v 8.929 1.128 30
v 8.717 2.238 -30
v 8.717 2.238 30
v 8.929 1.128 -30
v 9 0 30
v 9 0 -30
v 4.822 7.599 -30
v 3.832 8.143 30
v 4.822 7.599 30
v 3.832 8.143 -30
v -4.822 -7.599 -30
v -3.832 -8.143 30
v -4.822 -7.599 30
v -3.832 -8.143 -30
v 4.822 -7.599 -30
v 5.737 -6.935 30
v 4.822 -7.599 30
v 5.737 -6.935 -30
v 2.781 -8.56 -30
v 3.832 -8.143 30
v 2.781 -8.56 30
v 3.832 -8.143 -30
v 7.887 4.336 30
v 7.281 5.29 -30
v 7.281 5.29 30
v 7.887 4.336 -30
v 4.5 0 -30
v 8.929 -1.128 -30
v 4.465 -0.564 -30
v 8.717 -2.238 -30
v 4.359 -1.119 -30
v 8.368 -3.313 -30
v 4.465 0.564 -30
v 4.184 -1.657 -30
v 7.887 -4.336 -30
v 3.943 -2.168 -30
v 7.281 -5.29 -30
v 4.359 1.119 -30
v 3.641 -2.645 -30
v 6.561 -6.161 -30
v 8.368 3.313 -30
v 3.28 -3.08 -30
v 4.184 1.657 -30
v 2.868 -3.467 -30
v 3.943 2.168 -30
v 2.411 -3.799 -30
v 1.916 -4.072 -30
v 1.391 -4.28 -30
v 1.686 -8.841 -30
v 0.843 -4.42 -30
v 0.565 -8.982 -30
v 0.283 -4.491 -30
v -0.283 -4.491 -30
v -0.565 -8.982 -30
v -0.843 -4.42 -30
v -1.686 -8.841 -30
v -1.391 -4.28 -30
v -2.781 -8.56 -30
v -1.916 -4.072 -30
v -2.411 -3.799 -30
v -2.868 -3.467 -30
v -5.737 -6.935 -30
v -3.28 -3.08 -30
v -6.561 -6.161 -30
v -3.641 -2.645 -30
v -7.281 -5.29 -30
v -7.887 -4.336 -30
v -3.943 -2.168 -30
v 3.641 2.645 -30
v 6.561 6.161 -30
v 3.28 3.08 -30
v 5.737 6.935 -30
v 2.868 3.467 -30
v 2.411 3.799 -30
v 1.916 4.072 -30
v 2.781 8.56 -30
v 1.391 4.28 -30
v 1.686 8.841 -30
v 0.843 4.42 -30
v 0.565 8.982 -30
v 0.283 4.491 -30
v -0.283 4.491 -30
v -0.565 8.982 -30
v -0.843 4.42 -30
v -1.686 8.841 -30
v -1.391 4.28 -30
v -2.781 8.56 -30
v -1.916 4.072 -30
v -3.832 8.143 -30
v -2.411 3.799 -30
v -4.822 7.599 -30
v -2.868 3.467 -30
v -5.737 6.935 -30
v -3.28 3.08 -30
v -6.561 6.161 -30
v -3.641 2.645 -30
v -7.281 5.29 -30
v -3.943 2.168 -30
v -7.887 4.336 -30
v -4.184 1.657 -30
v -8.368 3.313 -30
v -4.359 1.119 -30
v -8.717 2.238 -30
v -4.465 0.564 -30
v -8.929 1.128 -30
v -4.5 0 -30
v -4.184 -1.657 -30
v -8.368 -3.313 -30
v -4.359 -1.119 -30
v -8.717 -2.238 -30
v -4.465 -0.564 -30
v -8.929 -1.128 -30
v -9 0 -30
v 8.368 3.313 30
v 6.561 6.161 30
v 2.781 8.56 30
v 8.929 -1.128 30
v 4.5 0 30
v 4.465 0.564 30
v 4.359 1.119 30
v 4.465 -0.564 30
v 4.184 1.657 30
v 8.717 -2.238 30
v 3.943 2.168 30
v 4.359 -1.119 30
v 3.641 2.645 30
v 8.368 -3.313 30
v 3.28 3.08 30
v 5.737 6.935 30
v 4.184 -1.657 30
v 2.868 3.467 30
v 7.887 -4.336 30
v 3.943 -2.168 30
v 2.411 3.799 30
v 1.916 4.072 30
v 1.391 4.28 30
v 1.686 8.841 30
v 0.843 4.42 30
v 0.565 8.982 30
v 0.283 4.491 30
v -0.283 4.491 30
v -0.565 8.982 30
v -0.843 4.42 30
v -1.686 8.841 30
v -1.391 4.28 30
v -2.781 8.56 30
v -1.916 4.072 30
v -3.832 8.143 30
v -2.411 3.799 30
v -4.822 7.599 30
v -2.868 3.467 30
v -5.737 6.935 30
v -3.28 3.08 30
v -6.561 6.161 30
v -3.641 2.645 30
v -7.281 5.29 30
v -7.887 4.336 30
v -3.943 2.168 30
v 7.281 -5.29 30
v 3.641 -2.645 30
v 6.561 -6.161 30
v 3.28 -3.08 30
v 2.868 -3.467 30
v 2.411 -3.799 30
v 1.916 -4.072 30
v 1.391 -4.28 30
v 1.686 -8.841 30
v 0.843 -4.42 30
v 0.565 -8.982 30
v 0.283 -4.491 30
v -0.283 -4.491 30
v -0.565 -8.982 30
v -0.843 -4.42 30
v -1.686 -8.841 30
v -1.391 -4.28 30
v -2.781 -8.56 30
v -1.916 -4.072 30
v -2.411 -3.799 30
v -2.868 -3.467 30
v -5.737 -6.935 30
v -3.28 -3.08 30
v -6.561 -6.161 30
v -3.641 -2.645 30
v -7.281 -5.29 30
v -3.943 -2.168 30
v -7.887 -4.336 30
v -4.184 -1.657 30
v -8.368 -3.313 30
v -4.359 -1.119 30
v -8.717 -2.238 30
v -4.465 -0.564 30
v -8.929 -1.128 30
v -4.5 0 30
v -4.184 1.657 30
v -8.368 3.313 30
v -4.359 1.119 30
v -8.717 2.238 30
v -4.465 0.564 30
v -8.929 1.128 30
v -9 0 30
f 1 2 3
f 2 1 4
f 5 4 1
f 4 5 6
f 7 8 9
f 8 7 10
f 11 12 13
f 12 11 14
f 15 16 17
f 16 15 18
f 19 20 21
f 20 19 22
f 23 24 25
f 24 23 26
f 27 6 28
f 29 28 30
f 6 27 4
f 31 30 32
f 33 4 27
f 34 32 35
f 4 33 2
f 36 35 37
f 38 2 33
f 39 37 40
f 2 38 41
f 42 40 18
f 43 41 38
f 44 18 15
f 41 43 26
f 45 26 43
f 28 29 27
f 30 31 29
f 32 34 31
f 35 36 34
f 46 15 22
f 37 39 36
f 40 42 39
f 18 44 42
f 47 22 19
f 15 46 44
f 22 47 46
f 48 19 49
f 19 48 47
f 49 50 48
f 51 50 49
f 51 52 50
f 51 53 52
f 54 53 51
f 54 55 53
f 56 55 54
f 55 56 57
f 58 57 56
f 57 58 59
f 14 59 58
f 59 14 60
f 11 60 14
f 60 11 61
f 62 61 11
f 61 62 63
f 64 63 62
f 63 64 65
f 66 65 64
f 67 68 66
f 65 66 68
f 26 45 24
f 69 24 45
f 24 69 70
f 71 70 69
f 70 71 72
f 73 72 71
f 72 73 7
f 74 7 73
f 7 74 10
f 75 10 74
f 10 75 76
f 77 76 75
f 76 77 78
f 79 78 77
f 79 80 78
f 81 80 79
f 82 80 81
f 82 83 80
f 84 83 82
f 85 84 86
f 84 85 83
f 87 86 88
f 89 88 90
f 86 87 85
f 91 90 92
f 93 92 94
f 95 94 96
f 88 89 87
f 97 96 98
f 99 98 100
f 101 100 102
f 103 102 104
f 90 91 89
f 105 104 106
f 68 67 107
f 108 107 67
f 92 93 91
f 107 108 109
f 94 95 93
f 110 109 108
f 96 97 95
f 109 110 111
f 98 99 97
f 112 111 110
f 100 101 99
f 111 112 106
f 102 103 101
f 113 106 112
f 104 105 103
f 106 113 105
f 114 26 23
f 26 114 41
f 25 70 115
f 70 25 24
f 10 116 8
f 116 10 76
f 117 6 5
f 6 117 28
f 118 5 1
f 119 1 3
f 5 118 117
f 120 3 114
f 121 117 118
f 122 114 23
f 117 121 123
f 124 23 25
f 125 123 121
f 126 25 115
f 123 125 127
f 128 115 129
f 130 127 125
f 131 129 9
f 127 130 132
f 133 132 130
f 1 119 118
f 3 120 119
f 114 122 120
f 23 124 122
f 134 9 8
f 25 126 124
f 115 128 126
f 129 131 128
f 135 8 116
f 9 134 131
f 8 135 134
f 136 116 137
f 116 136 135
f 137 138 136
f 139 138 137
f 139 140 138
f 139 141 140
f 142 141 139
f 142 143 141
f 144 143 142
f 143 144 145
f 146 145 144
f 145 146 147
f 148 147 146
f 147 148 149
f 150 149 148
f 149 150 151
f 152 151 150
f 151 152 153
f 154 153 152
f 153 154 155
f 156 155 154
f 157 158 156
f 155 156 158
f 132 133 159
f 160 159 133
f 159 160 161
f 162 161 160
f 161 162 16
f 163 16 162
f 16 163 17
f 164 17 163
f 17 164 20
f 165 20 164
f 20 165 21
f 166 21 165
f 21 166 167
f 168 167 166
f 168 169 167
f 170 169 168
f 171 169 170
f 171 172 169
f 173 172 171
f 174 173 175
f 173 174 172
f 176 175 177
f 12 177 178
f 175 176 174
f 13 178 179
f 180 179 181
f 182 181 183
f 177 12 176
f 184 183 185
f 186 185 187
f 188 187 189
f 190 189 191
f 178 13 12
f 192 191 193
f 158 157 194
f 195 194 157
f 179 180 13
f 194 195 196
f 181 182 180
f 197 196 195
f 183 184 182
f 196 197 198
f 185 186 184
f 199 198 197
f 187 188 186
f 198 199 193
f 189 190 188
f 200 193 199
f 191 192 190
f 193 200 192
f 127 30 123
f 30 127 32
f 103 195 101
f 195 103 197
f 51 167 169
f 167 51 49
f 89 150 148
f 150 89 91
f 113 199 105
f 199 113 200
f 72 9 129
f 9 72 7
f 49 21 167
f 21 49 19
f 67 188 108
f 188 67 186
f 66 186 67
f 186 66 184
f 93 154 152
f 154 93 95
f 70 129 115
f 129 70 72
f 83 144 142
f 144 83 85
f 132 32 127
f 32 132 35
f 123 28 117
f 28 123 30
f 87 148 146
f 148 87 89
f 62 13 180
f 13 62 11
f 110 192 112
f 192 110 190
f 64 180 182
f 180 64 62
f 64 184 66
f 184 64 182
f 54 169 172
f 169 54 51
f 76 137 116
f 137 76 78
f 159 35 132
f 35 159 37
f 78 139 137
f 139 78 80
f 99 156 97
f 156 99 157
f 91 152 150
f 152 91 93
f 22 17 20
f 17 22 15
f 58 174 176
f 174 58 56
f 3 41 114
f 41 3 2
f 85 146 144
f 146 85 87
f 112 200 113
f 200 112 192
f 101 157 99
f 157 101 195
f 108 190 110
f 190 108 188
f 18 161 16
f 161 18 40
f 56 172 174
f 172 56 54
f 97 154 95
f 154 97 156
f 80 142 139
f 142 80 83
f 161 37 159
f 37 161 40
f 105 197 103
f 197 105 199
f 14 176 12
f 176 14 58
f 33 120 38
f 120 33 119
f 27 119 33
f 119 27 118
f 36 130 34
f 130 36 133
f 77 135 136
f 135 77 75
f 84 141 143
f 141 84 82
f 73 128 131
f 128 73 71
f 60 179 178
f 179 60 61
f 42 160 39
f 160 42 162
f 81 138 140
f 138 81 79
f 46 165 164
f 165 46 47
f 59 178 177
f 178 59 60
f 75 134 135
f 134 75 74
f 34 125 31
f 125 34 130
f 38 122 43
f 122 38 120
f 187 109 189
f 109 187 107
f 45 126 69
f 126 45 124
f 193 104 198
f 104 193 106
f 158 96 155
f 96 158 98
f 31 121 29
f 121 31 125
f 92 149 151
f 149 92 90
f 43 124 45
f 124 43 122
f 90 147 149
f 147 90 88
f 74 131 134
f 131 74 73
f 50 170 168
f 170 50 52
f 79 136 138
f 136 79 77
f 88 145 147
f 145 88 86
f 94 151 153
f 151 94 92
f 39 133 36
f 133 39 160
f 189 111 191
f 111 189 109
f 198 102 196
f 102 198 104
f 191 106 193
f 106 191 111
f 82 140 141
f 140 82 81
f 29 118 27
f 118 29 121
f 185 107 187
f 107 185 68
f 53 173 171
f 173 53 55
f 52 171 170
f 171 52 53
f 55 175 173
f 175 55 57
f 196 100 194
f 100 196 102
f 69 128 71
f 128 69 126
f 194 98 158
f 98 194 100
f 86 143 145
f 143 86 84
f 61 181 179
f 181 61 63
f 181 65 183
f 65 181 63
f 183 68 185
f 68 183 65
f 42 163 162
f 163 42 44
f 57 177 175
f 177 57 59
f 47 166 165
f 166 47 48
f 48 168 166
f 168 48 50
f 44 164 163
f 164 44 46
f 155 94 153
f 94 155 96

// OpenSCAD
$fn = 50;


difference() {
	union() {
		translate(v = [0, 0, -30.0000000000]) {
			cylinder(h = 60, r = 9.0000000000);
		}
	}
	union() {
		translate(v = [0, 0, -100.0000000000]) {
			cylinder(h = 200, r = 4.5000000000);
		}
	}
}
